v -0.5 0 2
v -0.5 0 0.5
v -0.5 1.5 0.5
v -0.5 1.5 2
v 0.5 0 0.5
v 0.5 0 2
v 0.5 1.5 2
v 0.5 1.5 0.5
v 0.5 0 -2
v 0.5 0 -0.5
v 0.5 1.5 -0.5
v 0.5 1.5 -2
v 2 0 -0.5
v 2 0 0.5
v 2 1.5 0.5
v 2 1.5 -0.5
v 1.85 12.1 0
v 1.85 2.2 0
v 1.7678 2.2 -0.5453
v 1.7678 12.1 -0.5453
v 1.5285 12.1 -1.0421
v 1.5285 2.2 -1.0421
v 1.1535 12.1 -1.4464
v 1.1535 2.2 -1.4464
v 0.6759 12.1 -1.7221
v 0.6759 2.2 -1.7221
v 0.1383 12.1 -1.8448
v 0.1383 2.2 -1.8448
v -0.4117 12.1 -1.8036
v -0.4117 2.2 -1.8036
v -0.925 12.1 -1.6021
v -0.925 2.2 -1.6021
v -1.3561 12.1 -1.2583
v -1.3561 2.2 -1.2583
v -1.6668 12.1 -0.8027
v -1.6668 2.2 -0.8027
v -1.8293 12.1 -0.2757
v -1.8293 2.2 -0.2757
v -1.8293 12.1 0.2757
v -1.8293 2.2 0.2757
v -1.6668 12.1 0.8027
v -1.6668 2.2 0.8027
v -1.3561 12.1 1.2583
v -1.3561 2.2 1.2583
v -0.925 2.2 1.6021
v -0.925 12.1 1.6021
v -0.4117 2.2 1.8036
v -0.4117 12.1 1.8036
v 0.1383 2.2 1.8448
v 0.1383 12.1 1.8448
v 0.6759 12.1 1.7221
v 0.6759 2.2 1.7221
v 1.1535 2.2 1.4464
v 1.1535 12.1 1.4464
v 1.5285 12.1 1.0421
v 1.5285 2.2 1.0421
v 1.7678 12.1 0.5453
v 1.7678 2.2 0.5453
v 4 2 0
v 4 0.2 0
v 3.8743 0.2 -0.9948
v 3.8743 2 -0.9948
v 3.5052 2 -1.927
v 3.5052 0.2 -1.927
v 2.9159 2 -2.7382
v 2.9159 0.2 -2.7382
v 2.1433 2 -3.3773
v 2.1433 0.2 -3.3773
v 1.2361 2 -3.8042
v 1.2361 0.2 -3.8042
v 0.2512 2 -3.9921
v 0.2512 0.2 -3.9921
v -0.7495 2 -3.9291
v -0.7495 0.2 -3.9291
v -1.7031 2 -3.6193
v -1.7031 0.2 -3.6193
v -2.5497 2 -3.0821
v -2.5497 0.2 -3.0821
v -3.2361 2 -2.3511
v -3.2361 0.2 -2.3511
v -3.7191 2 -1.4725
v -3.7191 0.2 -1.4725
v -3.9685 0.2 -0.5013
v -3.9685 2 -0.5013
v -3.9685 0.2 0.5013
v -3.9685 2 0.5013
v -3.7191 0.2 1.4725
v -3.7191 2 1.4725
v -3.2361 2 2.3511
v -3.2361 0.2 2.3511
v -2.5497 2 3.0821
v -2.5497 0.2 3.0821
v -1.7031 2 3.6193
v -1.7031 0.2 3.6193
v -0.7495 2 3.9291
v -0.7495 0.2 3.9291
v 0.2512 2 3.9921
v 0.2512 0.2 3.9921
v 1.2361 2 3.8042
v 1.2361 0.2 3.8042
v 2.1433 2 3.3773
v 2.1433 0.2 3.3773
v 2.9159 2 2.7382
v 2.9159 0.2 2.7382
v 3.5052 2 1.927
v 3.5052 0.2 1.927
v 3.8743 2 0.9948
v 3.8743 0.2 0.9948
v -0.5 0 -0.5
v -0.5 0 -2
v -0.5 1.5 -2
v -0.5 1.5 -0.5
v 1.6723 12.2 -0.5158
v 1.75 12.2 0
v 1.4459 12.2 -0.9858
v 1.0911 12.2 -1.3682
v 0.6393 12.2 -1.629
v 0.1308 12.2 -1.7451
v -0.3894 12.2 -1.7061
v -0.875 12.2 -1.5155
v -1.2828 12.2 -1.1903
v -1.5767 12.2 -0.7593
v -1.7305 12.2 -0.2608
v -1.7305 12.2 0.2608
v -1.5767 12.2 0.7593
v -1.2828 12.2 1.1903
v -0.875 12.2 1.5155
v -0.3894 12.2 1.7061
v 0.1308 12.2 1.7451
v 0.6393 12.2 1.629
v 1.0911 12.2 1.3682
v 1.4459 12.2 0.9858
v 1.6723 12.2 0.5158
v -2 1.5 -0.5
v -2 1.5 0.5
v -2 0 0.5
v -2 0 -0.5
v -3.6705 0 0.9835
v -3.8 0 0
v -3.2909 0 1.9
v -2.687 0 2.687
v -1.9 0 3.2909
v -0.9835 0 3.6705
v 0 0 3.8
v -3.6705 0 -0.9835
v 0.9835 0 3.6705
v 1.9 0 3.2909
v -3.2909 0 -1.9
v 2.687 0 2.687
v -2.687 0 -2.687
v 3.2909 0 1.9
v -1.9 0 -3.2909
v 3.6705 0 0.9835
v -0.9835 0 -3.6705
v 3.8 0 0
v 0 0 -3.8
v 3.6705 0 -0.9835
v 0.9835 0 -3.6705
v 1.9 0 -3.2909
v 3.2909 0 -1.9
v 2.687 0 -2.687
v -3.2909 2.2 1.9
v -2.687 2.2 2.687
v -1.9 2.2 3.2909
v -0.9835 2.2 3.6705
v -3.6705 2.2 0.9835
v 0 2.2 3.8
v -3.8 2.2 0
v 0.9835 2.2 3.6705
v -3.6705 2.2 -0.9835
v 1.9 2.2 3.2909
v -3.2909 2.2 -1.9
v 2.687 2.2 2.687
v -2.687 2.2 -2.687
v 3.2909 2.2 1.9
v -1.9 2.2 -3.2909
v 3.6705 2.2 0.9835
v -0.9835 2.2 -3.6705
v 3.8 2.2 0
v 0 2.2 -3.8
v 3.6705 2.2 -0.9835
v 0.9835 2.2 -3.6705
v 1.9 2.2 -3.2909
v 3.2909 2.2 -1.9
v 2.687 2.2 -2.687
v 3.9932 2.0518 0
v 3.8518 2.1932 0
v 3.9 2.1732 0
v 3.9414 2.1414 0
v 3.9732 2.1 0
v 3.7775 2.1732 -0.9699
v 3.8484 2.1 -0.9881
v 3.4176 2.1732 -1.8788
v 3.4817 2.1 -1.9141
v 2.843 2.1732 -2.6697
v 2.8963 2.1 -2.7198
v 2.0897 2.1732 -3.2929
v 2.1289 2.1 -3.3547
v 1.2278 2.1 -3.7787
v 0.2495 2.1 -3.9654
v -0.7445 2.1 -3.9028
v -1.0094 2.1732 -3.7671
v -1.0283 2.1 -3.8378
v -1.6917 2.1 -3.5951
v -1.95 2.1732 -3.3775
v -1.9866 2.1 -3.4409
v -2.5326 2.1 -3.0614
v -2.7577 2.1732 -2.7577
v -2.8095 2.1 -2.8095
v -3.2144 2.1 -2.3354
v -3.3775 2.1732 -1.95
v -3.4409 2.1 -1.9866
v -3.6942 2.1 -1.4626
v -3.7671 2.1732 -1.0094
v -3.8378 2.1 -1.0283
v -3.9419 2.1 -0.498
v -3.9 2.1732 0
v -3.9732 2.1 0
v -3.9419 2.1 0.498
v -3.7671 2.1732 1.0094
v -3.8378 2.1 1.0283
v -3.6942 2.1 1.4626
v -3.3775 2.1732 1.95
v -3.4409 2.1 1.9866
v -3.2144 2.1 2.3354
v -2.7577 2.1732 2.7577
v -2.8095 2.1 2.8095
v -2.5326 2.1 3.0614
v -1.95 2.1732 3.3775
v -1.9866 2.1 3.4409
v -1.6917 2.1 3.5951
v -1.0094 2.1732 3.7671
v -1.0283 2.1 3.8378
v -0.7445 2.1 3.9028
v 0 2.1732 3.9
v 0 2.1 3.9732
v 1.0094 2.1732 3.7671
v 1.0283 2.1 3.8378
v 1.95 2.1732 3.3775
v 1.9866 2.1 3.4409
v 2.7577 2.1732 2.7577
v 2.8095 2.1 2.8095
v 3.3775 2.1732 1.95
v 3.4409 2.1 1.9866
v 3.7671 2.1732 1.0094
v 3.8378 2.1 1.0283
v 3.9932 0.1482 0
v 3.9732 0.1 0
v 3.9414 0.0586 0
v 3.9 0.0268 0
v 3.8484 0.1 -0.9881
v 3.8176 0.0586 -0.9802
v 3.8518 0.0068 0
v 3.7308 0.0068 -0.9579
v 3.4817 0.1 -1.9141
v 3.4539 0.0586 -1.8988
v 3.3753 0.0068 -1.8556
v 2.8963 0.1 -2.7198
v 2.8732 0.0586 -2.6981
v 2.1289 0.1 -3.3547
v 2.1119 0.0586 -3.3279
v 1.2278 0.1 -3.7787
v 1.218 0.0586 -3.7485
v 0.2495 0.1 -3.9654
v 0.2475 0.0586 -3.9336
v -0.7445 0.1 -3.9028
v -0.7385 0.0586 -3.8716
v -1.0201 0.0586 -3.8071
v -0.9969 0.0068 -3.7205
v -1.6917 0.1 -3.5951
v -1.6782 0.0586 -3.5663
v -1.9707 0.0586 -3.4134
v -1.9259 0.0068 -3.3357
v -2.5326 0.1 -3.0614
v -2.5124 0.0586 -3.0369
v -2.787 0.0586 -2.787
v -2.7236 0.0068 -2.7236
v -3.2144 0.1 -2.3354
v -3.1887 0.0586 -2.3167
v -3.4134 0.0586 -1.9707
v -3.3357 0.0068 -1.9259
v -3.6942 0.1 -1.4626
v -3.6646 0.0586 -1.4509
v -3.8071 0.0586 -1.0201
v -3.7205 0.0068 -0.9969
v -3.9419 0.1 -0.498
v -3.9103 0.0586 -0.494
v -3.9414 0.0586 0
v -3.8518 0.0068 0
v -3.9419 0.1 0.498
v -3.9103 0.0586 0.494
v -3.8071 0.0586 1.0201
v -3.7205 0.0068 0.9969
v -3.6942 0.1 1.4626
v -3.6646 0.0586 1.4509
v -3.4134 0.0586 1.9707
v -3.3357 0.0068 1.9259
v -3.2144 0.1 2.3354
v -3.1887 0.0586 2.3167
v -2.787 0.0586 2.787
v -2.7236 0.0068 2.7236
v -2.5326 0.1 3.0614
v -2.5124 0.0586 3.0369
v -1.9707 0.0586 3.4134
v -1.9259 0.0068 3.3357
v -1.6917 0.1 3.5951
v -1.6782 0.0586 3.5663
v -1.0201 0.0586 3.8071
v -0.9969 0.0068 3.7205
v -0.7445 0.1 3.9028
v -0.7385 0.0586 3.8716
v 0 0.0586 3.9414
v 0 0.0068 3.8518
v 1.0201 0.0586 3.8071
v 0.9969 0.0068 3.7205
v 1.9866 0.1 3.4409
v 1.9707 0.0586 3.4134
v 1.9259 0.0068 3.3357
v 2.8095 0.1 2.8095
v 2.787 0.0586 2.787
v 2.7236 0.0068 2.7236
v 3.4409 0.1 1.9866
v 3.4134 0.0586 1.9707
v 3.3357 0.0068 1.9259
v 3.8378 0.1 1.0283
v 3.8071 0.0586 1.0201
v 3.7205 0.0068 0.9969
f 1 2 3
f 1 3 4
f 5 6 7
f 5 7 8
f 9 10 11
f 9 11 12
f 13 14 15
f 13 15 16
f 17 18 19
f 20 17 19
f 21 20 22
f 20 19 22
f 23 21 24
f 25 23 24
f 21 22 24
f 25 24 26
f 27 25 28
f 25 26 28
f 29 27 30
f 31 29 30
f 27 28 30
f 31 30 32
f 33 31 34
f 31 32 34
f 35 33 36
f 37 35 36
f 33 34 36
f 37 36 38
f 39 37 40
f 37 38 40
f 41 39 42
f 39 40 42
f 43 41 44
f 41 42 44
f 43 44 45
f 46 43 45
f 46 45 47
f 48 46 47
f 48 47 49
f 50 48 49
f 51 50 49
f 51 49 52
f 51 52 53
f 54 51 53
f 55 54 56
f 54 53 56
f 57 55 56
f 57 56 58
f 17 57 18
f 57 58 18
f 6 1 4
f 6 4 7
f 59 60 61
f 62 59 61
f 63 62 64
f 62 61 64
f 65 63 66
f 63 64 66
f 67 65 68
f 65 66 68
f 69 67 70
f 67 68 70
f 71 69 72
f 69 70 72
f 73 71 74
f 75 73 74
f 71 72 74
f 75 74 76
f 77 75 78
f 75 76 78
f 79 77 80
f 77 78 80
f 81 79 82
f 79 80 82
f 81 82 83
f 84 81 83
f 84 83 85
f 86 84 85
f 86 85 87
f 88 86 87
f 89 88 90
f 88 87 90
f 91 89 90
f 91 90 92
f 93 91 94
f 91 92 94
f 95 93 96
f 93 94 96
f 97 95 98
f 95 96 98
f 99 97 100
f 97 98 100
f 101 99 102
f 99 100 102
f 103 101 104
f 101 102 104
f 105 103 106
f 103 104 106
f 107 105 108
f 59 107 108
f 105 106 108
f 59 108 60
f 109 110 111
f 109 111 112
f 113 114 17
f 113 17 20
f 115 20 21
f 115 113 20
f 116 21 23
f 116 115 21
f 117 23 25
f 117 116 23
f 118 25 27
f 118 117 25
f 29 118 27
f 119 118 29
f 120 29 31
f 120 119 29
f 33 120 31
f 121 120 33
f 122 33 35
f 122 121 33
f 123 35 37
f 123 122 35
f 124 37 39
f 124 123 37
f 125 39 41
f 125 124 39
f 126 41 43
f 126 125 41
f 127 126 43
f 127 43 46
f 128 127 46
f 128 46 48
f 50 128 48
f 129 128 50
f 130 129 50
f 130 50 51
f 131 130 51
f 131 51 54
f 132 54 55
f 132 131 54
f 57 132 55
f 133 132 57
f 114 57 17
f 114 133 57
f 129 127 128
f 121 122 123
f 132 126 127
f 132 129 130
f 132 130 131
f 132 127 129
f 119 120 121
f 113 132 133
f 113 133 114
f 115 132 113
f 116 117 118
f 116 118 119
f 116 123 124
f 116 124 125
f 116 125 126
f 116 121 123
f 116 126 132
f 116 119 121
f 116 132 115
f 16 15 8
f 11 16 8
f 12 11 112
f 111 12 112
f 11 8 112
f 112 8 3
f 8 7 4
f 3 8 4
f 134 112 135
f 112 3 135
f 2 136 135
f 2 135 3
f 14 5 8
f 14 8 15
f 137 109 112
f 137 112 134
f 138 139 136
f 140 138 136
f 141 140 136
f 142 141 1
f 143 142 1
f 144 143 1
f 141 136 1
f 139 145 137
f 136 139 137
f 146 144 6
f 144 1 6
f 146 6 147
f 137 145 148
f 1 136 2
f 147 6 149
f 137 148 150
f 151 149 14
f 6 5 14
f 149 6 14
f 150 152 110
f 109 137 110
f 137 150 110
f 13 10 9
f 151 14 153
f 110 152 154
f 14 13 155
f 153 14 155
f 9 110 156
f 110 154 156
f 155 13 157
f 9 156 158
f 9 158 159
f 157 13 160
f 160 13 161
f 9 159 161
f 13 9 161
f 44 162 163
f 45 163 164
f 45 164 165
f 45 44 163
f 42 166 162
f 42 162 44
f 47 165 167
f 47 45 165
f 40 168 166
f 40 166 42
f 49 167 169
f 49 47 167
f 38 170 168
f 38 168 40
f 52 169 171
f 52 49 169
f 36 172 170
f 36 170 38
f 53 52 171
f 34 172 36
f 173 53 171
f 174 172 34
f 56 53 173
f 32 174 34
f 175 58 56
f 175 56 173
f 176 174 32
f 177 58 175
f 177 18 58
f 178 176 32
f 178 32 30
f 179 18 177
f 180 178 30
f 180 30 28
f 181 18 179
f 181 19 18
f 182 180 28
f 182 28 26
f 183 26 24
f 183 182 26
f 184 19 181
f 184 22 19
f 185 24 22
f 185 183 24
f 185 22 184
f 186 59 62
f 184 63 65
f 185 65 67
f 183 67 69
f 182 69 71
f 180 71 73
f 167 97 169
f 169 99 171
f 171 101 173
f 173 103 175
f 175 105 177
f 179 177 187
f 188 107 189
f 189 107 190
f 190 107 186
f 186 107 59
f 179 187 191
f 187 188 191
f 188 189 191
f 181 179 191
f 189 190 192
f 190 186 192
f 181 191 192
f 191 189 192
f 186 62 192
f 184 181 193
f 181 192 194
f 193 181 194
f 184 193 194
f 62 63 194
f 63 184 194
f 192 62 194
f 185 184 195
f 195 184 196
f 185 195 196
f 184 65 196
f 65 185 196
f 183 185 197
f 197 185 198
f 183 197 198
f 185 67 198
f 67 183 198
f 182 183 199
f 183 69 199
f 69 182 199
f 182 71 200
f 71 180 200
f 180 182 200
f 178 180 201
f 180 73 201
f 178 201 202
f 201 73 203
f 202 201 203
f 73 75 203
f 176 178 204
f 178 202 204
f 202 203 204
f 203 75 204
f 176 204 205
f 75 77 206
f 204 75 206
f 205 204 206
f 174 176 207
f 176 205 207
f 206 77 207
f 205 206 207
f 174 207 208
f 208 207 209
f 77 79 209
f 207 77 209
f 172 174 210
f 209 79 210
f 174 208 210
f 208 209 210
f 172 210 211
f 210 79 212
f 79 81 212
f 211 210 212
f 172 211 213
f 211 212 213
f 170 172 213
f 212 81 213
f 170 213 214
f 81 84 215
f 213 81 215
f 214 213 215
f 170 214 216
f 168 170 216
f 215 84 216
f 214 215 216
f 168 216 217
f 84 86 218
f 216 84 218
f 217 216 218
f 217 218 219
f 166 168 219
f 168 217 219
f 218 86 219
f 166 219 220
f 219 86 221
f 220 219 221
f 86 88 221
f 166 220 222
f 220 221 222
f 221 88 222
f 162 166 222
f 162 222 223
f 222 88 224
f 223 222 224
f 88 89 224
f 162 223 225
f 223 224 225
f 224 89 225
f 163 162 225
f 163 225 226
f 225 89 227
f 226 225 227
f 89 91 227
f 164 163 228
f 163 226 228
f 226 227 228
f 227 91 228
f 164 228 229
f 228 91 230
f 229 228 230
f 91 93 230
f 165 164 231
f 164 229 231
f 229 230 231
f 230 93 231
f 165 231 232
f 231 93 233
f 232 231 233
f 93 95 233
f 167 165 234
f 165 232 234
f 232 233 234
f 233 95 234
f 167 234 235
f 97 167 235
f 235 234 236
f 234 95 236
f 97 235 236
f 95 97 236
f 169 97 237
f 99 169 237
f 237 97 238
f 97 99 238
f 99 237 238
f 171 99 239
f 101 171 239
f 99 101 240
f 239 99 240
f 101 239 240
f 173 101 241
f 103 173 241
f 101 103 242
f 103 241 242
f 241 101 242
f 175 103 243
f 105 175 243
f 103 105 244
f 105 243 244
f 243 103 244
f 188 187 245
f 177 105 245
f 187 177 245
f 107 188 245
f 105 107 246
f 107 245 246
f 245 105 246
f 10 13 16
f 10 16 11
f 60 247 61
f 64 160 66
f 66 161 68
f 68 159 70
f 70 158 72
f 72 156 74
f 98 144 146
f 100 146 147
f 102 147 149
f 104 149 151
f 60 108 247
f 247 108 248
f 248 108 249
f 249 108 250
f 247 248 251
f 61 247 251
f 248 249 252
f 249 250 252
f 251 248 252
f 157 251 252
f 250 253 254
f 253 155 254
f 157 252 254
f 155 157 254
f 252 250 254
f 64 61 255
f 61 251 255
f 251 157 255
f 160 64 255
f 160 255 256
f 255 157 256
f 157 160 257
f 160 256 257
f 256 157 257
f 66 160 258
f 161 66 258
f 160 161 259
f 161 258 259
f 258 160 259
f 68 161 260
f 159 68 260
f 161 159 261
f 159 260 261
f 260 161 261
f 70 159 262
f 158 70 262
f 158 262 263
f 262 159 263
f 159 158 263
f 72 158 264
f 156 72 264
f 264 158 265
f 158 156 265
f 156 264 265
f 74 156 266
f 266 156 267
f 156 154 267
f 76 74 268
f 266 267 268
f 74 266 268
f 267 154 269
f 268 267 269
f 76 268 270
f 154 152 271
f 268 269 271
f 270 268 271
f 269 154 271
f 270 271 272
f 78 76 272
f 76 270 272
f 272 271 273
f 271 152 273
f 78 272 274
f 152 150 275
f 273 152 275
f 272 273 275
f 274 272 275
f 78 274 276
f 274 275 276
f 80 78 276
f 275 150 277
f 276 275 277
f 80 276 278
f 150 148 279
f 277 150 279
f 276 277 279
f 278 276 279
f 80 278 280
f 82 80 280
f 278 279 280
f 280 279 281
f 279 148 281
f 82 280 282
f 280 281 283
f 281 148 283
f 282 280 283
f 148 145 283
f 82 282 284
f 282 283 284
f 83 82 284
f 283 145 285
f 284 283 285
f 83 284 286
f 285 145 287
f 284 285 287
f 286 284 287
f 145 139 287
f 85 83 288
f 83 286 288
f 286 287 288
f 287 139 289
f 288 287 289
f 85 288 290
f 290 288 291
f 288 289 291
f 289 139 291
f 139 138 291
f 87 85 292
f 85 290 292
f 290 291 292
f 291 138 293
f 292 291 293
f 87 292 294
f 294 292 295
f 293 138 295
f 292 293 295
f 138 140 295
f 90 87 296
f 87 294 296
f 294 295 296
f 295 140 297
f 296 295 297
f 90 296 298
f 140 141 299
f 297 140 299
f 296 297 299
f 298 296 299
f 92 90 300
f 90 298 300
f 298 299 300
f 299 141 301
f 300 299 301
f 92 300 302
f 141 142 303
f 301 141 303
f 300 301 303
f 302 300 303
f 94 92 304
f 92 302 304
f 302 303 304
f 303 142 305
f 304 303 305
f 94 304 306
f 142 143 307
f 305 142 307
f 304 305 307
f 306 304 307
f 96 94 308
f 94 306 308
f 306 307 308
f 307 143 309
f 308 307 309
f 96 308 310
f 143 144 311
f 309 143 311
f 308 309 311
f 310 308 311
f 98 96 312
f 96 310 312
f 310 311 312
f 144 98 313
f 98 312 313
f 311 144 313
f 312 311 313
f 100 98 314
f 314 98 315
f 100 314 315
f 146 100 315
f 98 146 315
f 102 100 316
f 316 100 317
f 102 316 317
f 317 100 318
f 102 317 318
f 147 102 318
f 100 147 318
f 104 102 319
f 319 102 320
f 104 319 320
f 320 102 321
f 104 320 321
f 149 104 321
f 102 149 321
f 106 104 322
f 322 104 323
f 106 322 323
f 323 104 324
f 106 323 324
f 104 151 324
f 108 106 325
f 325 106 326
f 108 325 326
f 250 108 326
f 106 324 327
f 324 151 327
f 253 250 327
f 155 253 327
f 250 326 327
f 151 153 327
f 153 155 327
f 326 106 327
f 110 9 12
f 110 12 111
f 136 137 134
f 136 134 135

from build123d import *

# Parameters (mm, degrees)
SKETCH_1_R          = 4
EXTRUDE_1_DEPTH     = 2.2
SKETCH_2_R          = 1.85
EXTRUDE_2_DEPTH     = 10
CHAMFER_1_SIZE      = 0.1
FILLET_1_R          = 0.2
CUT_EXTRUDE_1_DEPTH = 1.5


with BuildPart() as part:
    # Эскиз1 → Бобышка-Вытянуть1 (new body)
    with BuildSketch(Plane(origin=(0, 0, 0), x_dir=(1, 0, 0), z_dir=(0, 1, 0))):
        Circle(SKETCH_1_R)
    extrude(amount=EXTRUDE_1_DEPTH)

    # Эскиз2 → Бобышка-Вытянуть2 (add)
    with BuildSketch(Plane(origin=(0, 2.2, 0), x_dir=(1, 0, 0), z_dir=(0, 1, 0))):
        Circle(SKETCH_2_R)
    extrude(amount=EXTRUDE_2_DEPTH)

    # Фаска1
    chamfer_1_edges = [part.edges().sort_by_distance(p)[0] for p in [
        (-1.85, 12.2, 0),
    ]]
    chamfer(chamfer_1_edges, length=CHAMFER_1_SIZE)

    # Скругление1
    fillet_1_edges = [part.edges().sort_by_distance(p)[0] for p in [
        (-4, 0, 0),
        (-4, 2.2, 0),
    ]]
    fillet(fillet_1_edges, radius=FILLET_1_R)

    # Эскиз3 → Вырез-Вытянуть1 (cut)
    with BuildSketch(Plane.XZ):
        Polygon((-0.5, 0.5), (-0.5, 2), (0.5, 2), (0.5, 0.5), (2, 0.5), (2, -0.5), (0.5, -0.5), (0.5, -2), (-0.5, -2), (-0.5, -0.5), (-2, -0.5), (-2, 0.5), align=None)
    extrude(amount=-CUT_EXTRUDE_1_DEPTH, mode=Mode.SUBTRACT)


solid = part.part
